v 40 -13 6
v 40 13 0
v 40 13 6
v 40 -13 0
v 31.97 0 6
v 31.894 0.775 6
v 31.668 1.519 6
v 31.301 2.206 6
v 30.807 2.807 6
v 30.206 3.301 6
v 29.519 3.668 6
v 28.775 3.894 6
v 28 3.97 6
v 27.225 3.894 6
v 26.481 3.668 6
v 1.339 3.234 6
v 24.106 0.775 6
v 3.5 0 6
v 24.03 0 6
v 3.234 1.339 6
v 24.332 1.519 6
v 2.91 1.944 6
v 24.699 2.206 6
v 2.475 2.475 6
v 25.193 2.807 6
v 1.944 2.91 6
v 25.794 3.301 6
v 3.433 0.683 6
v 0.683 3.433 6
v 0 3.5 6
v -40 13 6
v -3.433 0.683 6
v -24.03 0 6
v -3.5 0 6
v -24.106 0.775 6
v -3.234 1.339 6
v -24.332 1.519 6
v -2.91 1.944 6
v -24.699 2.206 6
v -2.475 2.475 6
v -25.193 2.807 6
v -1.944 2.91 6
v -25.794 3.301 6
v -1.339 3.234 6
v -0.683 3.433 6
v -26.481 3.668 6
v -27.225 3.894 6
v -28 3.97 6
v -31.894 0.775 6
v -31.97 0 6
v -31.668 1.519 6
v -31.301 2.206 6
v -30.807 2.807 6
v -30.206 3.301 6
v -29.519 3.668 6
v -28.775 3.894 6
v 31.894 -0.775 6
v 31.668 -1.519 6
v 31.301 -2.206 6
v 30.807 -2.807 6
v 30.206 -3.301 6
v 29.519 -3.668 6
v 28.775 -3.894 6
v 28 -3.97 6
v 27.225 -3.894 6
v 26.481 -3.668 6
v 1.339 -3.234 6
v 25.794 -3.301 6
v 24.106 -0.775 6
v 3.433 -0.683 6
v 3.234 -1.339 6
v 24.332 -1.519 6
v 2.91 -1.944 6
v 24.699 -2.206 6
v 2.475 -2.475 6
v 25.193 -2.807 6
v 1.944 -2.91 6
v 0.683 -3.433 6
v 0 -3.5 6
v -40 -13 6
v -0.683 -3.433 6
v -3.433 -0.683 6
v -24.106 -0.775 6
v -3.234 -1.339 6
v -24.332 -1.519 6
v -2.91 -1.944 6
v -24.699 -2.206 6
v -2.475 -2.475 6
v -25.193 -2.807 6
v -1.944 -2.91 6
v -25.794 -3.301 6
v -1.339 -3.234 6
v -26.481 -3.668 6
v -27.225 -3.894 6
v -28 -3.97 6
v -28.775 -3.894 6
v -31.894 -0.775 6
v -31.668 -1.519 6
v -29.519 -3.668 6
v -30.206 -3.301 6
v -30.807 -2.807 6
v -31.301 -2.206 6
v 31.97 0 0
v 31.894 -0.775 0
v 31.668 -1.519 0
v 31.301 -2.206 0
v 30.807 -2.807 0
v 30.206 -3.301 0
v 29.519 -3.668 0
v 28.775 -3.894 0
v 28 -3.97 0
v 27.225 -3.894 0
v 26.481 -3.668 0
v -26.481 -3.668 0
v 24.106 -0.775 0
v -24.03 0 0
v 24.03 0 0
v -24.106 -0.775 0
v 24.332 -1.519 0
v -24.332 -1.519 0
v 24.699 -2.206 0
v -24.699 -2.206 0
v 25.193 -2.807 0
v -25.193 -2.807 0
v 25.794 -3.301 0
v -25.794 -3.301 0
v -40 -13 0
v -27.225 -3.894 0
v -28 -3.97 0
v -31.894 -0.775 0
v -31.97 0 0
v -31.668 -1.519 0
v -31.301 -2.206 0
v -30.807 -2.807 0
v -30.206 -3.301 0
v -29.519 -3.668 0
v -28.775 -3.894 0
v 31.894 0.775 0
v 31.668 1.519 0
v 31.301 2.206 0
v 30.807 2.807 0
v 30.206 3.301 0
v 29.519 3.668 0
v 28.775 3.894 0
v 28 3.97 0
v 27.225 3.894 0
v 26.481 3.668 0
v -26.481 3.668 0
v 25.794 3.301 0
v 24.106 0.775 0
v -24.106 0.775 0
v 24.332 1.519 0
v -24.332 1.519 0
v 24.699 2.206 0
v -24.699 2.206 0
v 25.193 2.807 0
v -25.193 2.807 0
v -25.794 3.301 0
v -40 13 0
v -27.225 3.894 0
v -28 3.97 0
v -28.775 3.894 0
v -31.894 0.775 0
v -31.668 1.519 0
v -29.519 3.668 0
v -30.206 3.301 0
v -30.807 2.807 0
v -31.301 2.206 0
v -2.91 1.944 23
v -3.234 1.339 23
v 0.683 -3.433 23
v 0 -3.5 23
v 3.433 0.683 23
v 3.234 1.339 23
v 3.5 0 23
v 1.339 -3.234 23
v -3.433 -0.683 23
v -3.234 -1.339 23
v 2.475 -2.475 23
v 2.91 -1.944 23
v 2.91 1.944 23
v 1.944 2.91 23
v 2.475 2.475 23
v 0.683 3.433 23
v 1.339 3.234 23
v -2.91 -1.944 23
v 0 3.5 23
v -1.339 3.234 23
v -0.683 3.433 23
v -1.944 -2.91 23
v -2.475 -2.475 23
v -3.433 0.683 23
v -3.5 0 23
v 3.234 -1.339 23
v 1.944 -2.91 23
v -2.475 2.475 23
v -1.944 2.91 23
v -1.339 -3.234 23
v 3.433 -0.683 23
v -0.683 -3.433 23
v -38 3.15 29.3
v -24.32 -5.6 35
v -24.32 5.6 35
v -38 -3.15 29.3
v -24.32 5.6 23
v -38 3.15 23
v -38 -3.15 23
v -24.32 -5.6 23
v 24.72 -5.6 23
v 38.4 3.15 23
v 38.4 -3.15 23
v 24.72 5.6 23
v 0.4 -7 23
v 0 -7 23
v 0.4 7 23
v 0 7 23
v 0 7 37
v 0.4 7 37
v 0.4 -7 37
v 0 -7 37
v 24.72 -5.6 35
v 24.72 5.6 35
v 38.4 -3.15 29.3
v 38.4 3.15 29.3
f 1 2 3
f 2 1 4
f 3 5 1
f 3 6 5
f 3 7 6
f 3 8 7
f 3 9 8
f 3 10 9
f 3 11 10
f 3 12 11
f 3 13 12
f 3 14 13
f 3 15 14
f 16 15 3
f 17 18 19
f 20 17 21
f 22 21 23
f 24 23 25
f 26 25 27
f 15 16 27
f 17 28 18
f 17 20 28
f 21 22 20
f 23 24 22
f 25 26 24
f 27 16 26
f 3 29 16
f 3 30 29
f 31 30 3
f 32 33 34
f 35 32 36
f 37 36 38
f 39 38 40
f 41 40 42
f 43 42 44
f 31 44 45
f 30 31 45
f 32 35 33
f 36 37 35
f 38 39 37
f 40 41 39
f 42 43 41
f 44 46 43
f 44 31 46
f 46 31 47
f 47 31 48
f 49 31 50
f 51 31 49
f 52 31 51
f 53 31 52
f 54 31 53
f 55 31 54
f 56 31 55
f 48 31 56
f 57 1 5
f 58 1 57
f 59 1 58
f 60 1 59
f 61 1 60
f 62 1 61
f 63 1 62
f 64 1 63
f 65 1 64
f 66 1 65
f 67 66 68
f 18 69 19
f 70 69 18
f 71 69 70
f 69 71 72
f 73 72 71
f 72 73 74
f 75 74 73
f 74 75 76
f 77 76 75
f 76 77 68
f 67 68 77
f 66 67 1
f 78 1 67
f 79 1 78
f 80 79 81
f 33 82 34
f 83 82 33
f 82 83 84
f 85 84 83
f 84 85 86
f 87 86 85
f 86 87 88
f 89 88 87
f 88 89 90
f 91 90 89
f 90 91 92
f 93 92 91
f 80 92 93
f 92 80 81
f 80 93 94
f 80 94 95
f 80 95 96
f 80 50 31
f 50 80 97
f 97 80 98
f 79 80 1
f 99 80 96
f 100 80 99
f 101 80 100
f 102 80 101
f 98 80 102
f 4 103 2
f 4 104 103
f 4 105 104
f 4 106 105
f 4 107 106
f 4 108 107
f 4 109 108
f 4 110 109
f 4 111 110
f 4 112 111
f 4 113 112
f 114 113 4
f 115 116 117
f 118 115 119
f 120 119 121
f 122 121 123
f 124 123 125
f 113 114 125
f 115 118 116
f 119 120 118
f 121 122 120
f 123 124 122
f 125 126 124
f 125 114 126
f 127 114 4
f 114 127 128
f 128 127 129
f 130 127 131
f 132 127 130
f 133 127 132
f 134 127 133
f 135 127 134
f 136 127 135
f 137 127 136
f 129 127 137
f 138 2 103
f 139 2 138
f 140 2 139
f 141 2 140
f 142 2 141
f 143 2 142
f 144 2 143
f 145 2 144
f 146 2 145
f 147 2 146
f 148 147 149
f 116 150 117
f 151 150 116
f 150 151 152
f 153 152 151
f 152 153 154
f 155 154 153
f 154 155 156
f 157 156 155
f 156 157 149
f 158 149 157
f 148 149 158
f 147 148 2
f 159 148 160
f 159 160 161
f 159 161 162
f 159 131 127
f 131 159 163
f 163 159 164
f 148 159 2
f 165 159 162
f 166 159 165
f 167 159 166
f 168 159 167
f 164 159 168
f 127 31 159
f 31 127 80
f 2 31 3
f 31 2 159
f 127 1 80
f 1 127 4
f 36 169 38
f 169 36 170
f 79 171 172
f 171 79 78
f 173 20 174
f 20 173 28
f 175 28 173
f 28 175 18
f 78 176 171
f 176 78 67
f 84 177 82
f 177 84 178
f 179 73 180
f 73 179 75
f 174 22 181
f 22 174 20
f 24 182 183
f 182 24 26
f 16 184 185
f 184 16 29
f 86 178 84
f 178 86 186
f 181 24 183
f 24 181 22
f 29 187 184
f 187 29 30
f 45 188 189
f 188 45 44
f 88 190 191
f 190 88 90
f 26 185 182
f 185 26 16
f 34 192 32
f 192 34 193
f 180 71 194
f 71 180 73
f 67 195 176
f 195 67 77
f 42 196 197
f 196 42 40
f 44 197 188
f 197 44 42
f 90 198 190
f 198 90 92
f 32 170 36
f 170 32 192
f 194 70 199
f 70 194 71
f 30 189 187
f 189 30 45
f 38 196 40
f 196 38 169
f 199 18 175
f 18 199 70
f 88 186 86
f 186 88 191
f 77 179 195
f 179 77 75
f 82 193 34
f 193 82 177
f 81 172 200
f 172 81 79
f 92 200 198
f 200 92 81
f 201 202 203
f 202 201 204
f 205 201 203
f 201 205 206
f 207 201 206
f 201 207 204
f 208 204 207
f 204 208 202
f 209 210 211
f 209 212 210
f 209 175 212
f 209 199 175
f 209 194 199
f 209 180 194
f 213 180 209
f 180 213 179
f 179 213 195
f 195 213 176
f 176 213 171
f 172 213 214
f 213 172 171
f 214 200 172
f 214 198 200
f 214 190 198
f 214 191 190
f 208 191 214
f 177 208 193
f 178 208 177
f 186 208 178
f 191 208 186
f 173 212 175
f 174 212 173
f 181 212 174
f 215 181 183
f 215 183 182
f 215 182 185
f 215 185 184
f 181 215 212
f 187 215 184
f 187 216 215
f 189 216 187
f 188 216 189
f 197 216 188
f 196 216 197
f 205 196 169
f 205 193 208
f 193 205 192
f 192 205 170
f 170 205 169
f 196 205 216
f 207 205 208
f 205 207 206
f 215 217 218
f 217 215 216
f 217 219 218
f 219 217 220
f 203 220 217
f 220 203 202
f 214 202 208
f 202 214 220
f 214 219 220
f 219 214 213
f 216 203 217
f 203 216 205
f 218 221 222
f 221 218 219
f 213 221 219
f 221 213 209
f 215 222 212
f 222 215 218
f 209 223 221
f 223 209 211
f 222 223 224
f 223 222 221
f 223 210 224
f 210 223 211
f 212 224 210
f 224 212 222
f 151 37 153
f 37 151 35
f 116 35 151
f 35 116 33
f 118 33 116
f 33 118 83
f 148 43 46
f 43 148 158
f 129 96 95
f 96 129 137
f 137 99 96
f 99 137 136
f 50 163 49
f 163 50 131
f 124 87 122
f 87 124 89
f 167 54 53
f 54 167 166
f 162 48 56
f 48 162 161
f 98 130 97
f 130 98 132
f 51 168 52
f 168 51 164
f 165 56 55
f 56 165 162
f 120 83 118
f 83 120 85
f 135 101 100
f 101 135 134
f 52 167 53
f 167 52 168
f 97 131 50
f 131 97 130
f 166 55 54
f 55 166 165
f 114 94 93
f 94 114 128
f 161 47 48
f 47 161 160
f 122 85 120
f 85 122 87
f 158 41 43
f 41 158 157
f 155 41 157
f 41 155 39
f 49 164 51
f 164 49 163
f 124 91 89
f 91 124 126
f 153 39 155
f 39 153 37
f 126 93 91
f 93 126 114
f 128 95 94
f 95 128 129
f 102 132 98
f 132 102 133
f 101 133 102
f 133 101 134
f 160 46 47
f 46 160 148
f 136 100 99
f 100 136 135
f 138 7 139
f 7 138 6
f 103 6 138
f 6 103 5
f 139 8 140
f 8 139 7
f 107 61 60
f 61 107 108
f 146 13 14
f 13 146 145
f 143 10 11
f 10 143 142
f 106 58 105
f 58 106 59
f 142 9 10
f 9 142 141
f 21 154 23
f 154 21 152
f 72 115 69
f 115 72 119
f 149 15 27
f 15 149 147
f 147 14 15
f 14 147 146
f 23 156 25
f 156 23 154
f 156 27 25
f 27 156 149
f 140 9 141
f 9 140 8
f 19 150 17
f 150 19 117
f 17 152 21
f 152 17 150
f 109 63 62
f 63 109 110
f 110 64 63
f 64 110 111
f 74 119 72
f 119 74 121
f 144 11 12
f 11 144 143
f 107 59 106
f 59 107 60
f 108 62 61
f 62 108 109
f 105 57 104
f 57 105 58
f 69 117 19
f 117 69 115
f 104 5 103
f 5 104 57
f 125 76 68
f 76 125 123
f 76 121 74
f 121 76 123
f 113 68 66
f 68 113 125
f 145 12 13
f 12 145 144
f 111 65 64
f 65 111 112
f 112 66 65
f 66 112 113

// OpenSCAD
$fn = 32;

// ----------------------------------------------------------------------
// Boat cleat: 80 mm base, horn 30 mm up
// ----------------------------------------------------------------------

// --- parameters (mm) ---
base_l = 80;              // base length
base_w = 26;              // base width
base_t = 6;               // base thickness
horn_len = 76;            // horn length
horn_d = 14;              // horn diameter at the middle
horn_z = 30;              // horn axis height
end_drop = 8;             // how far the horn tips drop
post_d = 7;               // centre post diameter
holes_d = 7.94;           // fixing holes
hole_x = 28;              // fixing hole spacing

difference() {
  union() {
    translate([-40, -13, 0]) cube([base_l, base_w, base_t]);
    /* centre post, sunk 1 mm into the base */
    translate([0, 0, 5]) cylinder(h = 25, d = post_d);
    /* horn: a hull chain of boxes, full in the middle and lighter at the tips */
    hull() {
      translate([-38, -3.15, 23]) cube([0.4, 6.3, 6.3], center = false);
      translate([-24.32, -5.6, 23]) cube([0.4, 11.2, 12], center = false);
    }
    hull() {
      translate([-24.32, -5.6, 23]) cube([0.4, 11.2, 12], center = false);
      translate([0, -7, 23]) cube([0.4, 14, 14], center = false);
    }
    hull() {
      translate([0, -7, 23]) cube([0.4, 14, 14], center = false);
      translate([24.32, -5.6, 23]) cube([0.4, 11.2, 12], center = false);
    }
    hull() {
      translate([24.32, -5.6, 23]) cube([0.4, 11.2, 12], center = false);
      translate([38, -3.15, 23]) cube([0.4, 6.3, 6.3], center = false);
    }
  }
  translate([-28, 0, -2.5]) cylinder(h = base_t + 5, d = holes_d);
  translate([28, 0, -2.5]) cylinder(h = base_t + 5, d = holes_d);
}
